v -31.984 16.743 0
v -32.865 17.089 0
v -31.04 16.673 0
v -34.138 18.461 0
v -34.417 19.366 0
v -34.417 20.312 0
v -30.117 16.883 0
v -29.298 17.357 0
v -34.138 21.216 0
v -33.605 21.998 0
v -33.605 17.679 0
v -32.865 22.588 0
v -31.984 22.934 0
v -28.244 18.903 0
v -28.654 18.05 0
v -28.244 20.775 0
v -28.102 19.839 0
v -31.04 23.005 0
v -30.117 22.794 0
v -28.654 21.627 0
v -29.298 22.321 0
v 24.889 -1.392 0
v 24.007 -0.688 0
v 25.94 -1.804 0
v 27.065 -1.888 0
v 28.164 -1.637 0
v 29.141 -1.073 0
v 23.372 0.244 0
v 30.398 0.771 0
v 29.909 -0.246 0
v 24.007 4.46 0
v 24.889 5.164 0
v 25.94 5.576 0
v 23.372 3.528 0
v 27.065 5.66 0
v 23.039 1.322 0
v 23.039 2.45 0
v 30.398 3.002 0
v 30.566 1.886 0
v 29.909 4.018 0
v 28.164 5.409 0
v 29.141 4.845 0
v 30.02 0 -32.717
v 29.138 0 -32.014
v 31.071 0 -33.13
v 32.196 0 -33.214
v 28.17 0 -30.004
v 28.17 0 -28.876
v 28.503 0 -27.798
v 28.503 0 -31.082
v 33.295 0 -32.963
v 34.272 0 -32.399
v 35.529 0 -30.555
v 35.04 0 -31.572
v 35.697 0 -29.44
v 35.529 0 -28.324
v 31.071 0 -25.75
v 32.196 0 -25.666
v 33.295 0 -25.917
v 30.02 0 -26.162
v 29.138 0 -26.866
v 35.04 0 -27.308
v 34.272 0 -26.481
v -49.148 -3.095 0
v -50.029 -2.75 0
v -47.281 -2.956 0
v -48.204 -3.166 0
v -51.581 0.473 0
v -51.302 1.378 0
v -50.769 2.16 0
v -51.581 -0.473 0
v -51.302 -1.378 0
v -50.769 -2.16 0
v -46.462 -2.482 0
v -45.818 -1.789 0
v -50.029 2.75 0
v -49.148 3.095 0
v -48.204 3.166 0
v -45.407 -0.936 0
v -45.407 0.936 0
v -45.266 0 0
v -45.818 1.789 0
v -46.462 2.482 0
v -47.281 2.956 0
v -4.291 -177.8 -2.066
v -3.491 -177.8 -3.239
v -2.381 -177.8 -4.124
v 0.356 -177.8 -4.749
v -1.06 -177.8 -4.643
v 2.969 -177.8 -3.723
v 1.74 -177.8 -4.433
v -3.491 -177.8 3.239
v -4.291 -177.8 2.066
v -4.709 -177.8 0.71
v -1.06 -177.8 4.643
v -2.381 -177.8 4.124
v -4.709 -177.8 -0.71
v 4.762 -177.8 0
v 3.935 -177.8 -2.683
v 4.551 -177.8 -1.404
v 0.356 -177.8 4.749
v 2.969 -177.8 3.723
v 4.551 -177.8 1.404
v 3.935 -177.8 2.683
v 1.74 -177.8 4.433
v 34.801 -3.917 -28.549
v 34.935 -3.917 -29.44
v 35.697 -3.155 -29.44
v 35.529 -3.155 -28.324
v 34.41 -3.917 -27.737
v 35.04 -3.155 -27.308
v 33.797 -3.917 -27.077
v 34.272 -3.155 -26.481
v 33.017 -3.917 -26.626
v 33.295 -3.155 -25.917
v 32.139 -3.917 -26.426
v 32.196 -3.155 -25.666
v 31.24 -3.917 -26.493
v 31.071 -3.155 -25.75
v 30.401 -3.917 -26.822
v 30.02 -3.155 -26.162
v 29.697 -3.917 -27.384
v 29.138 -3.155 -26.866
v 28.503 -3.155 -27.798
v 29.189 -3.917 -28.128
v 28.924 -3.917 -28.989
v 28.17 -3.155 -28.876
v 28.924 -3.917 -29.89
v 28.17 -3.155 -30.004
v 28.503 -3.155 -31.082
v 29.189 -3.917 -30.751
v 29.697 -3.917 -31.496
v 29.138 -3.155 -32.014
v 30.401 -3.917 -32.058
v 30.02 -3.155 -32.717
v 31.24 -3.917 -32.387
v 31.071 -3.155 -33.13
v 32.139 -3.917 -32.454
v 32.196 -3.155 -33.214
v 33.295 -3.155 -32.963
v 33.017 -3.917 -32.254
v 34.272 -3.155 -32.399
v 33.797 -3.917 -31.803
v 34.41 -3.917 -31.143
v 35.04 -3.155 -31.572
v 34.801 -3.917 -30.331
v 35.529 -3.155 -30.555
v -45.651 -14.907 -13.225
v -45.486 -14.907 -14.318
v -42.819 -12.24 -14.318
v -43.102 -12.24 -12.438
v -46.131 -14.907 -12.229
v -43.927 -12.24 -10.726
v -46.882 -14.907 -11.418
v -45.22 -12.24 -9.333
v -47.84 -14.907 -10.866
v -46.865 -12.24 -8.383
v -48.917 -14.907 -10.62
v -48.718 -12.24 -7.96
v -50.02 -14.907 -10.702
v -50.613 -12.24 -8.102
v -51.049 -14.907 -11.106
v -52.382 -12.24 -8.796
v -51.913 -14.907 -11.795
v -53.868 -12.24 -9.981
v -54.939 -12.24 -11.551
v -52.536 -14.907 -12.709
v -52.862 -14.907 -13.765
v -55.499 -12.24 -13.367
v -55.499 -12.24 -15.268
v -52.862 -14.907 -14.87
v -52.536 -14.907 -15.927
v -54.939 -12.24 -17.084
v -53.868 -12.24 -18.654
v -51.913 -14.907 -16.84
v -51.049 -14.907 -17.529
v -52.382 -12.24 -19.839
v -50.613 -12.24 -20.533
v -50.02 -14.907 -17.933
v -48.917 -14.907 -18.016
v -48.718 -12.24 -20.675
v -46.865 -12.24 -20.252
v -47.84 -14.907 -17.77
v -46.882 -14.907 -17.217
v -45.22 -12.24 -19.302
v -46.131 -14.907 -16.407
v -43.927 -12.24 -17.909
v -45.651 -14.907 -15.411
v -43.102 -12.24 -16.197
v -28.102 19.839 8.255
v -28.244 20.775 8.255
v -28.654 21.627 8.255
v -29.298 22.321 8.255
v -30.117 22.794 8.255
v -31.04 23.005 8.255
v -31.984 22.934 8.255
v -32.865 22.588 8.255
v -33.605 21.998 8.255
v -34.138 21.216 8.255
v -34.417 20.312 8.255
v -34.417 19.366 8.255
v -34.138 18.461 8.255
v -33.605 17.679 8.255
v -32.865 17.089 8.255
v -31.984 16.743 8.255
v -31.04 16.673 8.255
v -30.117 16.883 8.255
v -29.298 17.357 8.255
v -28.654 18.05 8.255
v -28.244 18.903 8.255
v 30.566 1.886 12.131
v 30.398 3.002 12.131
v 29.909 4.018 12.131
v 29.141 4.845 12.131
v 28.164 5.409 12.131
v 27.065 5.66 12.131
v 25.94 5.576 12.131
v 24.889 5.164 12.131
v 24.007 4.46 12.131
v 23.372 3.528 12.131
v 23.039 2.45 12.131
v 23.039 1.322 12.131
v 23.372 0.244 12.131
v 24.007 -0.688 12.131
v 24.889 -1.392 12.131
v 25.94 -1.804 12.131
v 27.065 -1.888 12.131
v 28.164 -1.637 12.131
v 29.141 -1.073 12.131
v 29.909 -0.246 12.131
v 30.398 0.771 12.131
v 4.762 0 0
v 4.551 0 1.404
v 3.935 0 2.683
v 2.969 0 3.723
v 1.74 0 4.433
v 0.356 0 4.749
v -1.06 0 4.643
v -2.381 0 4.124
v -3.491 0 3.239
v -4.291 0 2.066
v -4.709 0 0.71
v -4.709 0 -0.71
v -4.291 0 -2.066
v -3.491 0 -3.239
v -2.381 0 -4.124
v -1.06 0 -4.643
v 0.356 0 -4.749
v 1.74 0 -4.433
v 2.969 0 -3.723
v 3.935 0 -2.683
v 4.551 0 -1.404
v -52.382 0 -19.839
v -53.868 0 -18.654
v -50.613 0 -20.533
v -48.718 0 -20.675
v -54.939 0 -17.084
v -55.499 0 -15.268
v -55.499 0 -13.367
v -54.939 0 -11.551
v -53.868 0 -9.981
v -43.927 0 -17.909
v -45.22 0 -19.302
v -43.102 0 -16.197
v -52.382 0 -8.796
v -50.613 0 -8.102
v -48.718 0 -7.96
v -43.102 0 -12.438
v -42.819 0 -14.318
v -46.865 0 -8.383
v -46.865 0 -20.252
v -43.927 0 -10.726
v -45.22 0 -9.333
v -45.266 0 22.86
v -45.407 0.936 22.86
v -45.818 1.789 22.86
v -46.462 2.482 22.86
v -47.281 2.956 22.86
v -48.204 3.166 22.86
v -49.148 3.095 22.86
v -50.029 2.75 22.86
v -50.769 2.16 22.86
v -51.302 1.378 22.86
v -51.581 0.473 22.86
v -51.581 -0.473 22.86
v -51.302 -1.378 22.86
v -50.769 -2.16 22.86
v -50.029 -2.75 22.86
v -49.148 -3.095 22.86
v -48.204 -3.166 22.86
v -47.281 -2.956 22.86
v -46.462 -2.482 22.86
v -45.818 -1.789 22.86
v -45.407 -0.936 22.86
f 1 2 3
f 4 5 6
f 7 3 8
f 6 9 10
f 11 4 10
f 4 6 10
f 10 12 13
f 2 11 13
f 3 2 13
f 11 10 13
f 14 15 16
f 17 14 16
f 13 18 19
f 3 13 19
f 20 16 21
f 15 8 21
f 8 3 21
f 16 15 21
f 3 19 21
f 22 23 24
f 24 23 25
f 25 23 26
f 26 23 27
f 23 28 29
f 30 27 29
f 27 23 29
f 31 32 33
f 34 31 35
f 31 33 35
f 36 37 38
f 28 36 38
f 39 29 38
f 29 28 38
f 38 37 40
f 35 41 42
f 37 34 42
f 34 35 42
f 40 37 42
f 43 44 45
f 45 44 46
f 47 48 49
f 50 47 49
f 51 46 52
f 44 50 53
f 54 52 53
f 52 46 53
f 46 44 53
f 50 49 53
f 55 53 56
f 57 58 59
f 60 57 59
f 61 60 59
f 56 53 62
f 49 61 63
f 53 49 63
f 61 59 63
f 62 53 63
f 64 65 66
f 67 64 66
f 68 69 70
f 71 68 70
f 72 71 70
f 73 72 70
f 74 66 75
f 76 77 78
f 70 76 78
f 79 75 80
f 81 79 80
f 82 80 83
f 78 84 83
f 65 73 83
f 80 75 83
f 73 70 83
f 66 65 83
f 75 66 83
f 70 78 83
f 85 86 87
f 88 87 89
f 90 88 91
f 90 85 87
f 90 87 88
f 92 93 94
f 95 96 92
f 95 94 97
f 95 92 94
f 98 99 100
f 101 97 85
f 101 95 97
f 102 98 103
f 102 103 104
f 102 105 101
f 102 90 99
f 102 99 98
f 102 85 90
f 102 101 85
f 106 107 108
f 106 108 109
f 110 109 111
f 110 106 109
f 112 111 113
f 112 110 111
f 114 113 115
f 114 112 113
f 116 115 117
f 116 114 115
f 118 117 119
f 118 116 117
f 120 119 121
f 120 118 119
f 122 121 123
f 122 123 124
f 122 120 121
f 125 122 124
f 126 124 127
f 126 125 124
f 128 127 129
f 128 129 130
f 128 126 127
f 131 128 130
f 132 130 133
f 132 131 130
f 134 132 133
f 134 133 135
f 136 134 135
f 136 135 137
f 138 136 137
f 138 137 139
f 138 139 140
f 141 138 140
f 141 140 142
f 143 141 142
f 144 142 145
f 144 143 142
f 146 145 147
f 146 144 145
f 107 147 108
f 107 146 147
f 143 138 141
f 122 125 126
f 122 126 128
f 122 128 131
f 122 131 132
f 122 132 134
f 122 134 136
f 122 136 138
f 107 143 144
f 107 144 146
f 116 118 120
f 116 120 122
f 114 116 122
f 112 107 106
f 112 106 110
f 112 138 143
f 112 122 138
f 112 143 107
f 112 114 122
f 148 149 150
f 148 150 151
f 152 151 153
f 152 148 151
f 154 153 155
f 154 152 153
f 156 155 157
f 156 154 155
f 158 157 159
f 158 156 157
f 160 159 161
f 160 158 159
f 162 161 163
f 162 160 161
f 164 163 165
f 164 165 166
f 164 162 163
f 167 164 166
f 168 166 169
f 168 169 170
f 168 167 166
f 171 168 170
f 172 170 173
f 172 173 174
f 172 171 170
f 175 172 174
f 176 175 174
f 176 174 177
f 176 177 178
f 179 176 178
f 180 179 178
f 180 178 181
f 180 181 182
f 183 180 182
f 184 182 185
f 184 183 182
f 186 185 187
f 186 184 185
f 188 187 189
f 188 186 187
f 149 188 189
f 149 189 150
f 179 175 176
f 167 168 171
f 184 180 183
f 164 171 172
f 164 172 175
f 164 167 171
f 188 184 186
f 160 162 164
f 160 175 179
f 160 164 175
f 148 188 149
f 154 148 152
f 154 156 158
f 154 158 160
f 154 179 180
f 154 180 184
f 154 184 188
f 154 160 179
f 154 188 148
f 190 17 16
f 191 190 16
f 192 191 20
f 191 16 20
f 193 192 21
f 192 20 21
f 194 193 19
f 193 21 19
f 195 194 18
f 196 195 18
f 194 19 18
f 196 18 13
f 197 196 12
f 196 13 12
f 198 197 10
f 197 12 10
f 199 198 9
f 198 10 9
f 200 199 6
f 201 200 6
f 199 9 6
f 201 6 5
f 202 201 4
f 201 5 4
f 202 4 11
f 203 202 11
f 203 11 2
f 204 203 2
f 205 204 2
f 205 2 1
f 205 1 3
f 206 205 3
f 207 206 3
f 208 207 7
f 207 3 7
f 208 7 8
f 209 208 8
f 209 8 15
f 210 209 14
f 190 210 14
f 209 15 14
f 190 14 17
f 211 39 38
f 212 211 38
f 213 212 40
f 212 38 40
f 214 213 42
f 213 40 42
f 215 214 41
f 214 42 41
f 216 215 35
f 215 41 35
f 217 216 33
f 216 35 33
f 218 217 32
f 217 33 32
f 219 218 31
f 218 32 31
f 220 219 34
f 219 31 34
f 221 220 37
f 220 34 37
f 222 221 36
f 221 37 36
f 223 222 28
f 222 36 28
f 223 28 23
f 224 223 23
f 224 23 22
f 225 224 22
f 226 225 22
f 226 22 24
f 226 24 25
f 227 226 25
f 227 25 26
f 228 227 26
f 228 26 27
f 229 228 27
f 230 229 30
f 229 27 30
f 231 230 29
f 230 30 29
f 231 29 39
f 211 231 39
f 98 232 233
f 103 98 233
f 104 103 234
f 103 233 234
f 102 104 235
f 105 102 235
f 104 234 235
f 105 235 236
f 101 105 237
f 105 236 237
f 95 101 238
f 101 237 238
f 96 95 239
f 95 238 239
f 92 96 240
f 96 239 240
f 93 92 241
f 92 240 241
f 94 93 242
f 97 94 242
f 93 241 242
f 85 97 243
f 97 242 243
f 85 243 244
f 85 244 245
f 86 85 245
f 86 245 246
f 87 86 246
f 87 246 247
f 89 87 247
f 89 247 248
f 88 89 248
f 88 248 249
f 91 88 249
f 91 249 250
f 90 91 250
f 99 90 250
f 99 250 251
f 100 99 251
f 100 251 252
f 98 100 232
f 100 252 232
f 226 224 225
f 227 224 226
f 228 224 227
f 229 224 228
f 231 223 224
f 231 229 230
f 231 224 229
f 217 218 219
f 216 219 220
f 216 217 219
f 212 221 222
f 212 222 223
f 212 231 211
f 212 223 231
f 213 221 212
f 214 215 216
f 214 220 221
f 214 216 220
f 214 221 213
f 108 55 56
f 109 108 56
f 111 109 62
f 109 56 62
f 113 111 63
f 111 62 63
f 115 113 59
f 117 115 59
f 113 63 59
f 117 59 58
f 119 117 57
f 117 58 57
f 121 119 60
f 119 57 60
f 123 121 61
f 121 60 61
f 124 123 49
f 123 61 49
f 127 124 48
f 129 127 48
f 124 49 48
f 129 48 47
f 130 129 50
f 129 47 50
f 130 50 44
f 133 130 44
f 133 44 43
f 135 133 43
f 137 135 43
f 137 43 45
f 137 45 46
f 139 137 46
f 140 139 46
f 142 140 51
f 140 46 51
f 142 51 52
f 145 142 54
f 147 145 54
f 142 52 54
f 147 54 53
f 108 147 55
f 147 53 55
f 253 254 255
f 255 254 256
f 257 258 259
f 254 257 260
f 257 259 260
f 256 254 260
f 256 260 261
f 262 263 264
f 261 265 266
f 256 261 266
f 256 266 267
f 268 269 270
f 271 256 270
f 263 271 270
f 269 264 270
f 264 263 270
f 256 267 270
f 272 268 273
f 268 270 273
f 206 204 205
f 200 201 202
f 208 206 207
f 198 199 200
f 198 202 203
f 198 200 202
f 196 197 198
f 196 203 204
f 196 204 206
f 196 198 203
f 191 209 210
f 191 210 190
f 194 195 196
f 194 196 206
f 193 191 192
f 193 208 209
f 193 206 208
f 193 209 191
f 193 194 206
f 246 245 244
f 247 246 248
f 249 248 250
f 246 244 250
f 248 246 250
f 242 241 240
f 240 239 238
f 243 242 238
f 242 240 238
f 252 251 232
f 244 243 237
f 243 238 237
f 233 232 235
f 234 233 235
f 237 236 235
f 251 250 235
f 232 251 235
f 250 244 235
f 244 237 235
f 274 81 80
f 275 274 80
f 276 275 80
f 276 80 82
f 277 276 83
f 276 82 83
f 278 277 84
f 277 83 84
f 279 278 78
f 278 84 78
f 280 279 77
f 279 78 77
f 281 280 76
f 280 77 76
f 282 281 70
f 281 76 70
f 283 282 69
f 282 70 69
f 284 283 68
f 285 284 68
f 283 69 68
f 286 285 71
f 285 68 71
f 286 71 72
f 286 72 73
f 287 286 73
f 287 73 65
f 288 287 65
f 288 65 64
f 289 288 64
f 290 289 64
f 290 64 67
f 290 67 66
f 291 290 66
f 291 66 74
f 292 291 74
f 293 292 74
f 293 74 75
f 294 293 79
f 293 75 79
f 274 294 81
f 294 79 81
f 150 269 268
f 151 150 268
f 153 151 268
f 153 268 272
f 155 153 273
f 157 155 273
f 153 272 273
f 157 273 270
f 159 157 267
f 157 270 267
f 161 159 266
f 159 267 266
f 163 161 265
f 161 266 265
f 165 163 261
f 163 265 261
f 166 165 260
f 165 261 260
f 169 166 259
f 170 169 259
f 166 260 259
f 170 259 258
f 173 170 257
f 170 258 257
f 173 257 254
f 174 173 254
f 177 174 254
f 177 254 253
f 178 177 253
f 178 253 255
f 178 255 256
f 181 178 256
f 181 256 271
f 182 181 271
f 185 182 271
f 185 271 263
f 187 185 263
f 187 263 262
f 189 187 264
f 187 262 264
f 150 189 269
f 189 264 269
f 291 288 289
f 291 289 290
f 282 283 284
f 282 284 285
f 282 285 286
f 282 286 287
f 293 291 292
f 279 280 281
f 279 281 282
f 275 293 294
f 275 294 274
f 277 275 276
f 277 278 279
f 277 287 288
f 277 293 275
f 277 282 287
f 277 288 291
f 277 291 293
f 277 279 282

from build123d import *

# Parameters (mm, degrees)
F0_R      = 4.7625
F1_DEPTH  = 177.8
F4_R      = 3.175
F5_DEPTH  = 8.255
F2_R      = 3.175
F6_DEPTH  = 22.86
F8_R      = 3.7846
F9_DEPTH  = 12.13104
F10_R     = 6.3754
F11_DEPTH = 14.90726
F12_SIZE  = 2.667
F13_R     = 3.7846
F14_DEPTH = 3.91668
F15_SIZE  = 0.762


# Not quite as in the source:
# - the program builds the solid bodies; features that only make, move or delete a surface that nothing else refers to are left out


with BuildPart() as f1:
    # F0 (on Front) → F1 (new body)
    with BuildSketch(Plane.XZ):
        Circle(F0_R)
    extrude(amount=F1_DEPTH)


with BuildPart() as f5:
    # F4 (on Top) → F5 (new body)
    with BuildSketch(Plane.XY):
        with Locations((-31.2774516642, 19.8388285935)):
            Circle(F4_R)
    extrude(amount=F5_DEPTH)


with BuildPart() as f6:
    # F2 (on Top) → F6 (new body)
    with BuildSketch(Plane.XY):
        with Locations((-48.4413914382, 0)):
            Circle(F2_R)
    extrude(amount=F6_DEPTH)


with BuildPart() as f9:
    # F8 (on Top) → F9 (new body)
    with BuildSketch(Plane.XY):
        with Locations((26.7817564309, 1.8860386917)):
            Circle(F8_R)
    extrude(amount=F9_DEPTH)


with BuildPart() as f11:
    # F10 (on Front) → F11 (new body)
    with BuildSketch(Plane.XZ):
        with Locations((-49.1946190596, -14.3176335841)):
            Circle(F10_R)
    extrude(amount=F11_DEPTH)

    # F12
    f12_edges = [f11.edges().sort_by_distance(p)[0] for p in [
        (-55.570019, -14.90726, -14.317634),
    ]]
    chamfer(f12_edges, length=F12_SIZE)


with BuildPart() as f14:
    # F13 (on Front) → F14 (new body)
    with BuildSketch(Plane.XZ):
        with Locations((31.9127030671, -29.4398516417)):
            Circle(F13_R)
    extrude(amount=F14_DEPTH)

    # F15
    f15_edges = [f14.edges().sort_by_distance(p)[0] for p in [
        (28.128103, -3.91668, -29.439852),
    ]]
    chamfer(f15_edges, length=F15_SIZE)


solid = Compound([f1.part, f5.part, f6.part, f9.part, f11.part, f14.part])
